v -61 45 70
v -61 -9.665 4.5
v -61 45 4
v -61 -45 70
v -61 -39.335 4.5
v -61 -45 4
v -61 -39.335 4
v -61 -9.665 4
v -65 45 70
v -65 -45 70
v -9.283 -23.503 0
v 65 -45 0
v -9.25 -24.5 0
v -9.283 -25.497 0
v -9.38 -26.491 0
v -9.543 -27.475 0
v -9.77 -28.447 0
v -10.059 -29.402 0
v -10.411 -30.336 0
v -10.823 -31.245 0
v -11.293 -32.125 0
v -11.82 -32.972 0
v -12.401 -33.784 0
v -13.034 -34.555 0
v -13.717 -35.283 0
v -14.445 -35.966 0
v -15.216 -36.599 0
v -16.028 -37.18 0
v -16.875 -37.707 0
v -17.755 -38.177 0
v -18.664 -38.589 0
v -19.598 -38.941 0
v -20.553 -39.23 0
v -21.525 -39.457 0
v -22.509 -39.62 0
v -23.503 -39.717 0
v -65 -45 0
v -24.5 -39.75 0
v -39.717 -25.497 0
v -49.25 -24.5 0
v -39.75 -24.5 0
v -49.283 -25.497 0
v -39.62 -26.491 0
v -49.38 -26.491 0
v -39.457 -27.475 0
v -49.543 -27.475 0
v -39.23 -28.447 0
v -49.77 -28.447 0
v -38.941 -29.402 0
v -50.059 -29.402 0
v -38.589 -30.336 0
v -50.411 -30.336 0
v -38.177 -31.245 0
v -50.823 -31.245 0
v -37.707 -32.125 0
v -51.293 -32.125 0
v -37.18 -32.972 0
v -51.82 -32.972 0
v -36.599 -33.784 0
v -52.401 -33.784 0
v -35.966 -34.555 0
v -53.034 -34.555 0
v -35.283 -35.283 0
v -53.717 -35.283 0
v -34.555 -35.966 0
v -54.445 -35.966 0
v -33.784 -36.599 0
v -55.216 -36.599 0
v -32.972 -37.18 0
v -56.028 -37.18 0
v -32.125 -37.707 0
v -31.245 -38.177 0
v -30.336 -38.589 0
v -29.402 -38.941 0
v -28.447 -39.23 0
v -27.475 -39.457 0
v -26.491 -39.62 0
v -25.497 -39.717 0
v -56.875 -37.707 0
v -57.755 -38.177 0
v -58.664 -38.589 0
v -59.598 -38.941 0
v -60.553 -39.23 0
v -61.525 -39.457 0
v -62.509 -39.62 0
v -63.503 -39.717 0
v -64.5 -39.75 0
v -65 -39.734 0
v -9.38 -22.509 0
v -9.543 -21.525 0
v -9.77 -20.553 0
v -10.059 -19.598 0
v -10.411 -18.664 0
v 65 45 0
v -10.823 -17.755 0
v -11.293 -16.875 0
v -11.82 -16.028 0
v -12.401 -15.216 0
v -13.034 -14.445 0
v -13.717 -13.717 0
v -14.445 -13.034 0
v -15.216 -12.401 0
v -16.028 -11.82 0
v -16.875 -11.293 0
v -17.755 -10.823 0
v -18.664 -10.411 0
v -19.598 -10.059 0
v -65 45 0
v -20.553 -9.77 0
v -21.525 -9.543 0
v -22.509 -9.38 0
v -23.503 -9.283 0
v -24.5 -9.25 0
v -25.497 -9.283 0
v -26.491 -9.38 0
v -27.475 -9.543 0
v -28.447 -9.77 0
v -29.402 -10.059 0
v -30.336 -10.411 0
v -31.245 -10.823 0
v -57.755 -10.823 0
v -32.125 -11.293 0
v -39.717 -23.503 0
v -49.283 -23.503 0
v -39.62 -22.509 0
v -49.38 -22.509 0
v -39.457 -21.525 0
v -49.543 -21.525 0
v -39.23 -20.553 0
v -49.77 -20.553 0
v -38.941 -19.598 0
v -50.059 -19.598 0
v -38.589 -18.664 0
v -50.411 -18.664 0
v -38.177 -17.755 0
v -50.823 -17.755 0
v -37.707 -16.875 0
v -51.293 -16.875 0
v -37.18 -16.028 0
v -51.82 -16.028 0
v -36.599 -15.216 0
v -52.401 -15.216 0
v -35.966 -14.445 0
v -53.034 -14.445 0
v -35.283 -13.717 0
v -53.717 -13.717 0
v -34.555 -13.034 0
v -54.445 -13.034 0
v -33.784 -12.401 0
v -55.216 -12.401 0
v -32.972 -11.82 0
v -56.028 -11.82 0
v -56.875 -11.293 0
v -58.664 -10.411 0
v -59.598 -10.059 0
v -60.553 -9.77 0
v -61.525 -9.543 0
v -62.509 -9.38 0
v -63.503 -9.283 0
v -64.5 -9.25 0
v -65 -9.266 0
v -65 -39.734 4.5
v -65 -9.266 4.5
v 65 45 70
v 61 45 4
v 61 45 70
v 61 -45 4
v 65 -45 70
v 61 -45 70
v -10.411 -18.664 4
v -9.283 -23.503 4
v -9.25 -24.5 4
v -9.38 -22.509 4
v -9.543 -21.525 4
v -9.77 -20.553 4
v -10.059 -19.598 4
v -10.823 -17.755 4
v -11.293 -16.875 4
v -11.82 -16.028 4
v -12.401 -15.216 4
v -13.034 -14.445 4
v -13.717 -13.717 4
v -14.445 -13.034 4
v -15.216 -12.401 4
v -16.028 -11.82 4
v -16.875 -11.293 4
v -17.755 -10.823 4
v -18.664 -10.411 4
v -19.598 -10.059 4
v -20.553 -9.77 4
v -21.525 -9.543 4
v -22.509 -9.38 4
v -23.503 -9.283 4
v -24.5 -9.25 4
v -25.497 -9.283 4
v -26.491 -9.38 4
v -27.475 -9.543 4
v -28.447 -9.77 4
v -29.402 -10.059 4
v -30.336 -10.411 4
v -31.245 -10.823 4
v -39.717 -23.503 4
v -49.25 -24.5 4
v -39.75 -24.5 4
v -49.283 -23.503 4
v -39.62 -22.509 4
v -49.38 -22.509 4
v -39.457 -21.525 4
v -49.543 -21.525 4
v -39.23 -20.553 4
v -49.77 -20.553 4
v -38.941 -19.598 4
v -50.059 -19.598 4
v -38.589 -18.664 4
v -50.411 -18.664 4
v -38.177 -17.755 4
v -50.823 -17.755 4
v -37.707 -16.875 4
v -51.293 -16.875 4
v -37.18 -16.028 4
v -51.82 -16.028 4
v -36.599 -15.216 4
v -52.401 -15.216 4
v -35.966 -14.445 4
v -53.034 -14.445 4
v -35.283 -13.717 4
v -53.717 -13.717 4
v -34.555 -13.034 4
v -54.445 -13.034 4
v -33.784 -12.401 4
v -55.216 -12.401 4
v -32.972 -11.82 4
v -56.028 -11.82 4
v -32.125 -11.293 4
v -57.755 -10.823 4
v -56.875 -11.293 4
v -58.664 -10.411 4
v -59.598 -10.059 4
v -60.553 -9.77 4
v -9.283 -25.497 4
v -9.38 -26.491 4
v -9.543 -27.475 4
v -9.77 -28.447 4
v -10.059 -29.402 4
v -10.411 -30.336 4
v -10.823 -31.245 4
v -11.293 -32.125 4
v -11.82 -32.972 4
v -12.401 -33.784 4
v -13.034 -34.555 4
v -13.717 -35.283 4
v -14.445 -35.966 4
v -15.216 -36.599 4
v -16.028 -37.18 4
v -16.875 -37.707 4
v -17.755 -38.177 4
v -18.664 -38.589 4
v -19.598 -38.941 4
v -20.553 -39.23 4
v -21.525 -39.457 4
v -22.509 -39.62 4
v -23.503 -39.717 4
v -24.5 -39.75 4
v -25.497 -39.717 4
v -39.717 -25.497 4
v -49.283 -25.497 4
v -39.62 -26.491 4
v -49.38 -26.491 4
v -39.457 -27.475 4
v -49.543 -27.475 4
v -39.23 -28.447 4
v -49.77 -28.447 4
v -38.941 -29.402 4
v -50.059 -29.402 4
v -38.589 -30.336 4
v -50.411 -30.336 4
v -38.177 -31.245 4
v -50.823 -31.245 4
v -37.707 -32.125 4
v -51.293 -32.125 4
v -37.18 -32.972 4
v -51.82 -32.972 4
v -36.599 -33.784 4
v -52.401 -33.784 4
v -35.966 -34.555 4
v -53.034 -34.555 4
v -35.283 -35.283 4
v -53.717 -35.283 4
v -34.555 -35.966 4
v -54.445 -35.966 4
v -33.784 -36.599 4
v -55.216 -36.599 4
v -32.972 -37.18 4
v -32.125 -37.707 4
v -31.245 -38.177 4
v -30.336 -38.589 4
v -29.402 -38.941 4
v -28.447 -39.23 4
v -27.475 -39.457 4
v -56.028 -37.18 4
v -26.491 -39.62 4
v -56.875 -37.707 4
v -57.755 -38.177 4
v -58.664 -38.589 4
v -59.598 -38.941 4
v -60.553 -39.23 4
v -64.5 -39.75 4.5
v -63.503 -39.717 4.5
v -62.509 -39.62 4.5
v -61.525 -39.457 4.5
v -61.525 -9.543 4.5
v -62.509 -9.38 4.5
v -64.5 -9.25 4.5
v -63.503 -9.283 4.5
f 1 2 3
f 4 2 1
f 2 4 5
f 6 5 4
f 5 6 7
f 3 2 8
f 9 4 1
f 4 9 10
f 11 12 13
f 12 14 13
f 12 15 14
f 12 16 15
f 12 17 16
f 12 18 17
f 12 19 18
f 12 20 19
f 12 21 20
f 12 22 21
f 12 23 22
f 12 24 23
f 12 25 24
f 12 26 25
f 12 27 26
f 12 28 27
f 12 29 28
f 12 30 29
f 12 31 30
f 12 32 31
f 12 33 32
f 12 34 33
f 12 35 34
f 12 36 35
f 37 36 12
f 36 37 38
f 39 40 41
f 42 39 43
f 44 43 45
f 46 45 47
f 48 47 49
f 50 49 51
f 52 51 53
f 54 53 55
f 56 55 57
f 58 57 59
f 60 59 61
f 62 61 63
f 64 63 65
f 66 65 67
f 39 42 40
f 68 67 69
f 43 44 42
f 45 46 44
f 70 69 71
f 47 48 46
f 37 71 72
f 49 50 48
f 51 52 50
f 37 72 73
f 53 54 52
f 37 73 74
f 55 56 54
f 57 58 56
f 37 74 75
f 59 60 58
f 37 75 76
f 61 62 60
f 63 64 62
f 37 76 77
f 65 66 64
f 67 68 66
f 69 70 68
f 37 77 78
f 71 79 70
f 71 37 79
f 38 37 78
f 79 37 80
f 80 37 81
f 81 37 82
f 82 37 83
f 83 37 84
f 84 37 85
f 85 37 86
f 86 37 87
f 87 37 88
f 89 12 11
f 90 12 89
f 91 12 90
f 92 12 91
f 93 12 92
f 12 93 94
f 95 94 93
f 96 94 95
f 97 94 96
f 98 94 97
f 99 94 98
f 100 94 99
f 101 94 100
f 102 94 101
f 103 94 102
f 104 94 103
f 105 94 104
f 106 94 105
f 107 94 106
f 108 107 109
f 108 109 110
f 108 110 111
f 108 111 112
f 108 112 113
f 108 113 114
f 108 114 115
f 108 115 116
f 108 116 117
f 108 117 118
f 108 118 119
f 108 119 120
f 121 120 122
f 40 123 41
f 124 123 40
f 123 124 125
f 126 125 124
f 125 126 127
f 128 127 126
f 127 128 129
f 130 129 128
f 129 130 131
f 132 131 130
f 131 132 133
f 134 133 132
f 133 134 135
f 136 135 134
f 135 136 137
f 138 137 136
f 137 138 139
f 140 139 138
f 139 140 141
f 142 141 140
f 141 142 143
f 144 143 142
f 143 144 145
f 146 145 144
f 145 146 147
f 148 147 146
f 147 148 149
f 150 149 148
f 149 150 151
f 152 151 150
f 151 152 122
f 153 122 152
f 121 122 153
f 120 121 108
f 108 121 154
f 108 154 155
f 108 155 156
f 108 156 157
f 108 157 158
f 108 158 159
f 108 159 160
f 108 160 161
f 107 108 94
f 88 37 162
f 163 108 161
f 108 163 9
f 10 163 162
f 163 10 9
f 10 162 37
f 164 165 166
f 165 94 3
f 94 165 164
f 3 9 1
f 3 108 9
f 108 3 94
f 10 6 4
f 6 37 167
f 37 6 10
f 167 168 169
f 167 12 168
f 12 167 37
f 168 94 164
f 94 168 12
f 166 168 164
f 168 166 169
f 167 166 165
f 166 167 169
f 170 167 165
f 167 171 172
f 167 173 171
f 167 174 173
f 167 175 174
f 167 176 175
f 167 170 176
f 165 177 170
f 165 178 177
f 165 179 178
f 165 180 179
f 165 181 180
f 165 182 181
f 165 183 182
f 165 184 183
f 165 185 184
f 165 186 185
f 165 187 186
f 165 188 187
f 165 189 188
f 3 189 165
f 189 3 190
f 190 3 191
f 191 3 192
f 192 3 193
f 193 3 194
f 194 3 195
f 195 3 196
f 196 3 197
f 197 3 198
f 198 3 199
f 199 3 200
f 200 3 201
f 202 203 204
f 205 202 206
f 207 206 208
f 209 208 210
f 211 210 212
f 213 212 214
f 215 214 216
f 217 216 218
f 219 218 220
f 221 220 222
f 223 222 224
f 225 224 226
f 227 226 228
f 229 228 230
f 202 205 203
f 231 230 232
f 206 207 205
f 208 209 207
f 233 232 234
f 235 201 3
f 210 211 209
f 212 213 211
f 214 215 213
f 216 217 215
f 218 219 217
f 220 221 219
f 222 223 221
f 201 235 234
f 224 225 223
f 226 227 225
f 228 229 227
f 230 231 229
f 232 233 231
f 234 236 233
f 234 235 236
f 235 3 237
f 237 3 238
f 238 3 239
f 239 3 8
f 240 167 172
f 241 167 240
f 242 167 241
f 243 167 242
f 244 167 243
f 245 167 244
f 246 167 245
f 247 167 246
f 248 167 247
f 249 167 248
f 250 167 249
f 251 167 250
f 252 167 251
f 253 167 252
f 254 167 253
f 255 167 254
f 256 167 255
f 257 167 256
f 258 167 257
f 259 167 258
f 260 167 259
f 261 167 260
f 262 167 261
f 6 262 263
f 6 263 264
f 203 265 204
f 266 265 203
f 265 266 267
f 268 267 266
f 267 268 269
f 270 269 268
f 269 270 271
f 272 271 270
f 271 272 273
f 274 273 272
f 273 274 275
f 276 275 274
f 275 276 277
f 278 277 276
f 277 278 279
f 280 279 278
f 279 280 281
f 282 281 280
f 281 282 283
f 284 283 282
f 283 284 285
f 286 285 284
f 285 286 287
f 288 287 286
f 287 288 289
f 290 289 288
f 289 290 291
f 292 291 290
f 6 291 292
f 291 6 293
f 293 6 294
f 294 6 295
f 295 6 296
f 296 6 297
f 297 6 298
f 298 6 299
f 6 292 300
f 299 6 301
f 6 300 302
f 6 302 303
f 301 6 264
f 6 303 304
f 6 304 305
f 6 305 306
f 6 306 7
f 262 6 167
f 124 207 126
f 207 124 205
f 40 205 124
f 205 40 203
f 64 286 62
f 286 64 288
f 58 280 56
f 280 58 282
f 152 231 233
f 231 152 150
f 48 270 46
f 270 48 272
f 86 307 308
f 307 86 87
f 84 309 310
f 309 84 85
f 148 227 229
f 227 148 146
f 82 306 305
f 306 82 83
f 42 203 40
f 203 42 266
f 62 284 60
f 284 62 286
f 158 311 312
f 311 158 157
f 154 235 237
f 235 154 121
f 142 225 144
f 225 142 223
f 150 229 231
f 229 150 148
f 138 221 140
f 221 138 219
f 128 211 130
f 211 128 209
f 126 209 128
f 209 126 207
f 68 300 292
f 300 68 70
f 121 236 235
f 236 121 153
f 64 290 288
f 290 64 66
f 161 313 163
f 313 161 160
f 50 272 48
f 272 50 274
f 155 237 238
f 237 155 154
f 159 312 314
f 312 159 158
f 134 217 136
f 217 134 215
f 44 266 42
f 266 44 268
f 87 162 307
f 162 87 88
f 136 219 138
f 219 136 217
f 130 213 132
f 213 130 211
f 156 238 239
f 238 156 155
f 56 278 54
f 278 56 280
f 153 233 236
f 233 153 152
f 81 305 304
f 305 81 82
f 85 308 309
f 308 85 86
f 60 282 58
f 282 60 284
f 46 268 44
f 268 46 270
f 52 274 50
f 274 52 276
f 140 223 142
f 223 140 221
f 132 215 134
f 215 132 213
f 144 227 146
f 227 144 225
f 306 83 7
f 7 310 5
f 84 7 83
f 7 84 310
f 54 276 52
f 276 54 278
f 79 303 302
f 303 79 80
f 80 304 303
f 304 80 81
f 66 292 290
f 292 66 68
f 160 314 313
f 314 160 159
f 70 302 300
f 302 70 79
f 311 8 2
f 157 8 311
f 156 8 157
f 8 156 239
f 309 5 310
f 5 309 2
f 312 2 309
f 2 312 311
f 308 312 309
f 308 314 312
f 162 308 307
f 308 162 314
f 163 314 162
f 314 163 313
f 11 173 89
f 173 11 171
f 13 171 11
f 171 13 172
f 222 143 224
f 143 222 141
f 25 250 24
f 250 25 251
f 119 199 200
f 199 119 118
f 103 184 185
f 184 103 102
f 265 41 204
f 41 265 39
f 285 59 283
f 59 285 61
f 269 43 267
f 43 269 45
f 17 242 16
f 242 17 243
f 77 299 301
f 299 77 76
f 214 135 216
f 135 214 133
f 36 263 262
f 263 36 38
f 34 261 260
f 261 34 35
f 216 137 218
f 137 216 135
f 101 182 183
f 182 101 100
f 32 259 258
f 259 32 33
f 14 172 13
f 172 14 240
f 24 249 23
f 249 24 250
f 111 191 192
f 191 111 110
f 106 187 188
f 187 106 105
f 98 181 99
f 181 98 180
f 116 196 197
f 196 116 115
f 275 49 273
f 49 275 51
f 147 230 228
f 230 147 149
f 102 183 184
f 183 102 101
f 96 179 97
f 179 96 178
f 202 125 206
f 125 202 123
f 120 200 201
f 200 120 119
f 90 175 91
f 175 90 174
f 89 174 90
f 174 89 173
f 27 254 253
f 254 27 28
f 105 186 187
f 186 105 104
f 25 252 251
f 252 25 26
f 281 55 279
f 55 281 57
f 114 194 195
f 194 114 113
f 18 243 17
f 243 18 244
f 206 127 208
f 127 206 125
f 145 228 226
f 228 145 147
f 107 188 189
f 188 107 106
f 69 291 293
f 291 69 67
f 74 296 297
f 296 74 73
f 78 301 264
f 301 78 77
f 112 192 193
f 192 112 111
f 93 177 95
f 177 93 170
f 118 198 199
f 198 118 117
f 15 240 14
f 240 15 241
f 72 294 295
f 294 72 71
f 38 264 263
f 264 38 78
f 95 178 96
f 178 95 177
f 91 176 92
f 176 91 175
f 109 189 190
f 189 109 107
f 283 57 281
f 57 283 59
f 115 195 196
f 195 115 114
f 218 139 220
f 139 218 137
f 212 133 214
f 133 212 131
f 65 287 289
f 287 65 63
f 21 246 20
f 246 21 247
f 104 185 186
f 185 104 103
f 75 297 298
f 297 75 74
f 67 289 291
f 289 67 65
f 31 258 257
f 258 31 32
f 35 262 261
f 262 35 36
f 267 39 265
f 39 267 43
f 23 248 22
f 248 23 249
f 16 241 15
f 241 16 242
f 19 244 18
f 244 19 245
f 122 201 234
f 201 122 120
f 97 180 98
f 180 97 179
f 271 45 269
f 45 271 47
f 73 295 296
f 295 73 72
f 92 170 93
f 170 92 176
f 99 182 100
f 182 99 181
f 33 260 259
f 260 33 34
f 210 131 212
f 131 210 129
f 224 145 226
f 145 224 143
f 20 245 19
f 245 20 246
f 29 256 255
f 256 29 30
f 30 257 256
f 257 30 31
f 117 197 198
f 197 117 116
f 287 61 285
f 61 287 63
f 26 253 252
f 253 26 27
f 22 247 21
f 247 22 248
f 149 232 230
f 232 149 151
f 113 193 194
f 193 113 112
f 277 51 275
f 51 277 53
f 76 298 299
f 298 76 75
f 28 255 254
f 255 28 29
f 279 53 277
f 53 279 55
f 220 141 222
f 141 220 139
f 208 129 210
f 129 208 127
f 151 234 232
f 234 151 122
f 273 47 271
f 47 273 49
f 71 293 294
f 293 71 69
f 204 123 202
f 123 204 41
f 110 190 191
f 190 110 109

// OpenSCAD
// Rack for six 50 mL conical (Falcon-type) tubes
// Print orientation: flat plate on bed, walls rising to z = 70
// Flip after printing so the rack stands on the two walls

// ---------------- Parameters ----------------
plate_x      = 130;   // plate length along X (mm)
plate_y      = 90;    // plate width along Y (mm)
plate_t      = 4;     // plate thickness (mm), z = 0..4

hole_d       = 30.5;  // through-hole diameter (mm)
hole_nx      = 3;     // holes along X (2 rows x 3 columns)
hole_ny      = 2;     // holes along Y
hole_pitch   = 40;    // centre-to-centre spacing in X and Y (mm)

wall_t       = 4;     // wall thickness along Y (mm), flush with long edge
wall_h       = 70;    // wall top height (mm), z = 0..70

eps          = 0.5;   // cutter overshoot past faces (mm)
$fn          = 96;    // circle resolution

// ---------------- Model ----------------
difference() {
    union() {
        // Flat base plate
        translate([-plate_x/2, -plate_y/2, 0])
            cube([plate_x, plate_y, plate_t]);

        // Two solid walls along the long edges
        for (sx = [-1, 1])
            translate([sx > 0 ? plate_x/2 - wall_t : -plate_x/2,
                       -plate_y/2, 0])
                cube([wall_t, plate_y, wall_h]);
    }

    // Through-holes in a 2 x 3 grid, centred on the plate
    for (i = [0 : hole_nx - 1])
        for (j = [0 : hole_ny - 1])
            translate([(i - (hole_nx - 1)/2) * hole_pitch - plate_x/2 + eps,
                       (j - (hole_ny - 1)/2) * hole_pitch - plate_y/2 + eps,
                       -eps])
                cylinder(d = hole_d, h = plate_t + 2 * eps);
}
